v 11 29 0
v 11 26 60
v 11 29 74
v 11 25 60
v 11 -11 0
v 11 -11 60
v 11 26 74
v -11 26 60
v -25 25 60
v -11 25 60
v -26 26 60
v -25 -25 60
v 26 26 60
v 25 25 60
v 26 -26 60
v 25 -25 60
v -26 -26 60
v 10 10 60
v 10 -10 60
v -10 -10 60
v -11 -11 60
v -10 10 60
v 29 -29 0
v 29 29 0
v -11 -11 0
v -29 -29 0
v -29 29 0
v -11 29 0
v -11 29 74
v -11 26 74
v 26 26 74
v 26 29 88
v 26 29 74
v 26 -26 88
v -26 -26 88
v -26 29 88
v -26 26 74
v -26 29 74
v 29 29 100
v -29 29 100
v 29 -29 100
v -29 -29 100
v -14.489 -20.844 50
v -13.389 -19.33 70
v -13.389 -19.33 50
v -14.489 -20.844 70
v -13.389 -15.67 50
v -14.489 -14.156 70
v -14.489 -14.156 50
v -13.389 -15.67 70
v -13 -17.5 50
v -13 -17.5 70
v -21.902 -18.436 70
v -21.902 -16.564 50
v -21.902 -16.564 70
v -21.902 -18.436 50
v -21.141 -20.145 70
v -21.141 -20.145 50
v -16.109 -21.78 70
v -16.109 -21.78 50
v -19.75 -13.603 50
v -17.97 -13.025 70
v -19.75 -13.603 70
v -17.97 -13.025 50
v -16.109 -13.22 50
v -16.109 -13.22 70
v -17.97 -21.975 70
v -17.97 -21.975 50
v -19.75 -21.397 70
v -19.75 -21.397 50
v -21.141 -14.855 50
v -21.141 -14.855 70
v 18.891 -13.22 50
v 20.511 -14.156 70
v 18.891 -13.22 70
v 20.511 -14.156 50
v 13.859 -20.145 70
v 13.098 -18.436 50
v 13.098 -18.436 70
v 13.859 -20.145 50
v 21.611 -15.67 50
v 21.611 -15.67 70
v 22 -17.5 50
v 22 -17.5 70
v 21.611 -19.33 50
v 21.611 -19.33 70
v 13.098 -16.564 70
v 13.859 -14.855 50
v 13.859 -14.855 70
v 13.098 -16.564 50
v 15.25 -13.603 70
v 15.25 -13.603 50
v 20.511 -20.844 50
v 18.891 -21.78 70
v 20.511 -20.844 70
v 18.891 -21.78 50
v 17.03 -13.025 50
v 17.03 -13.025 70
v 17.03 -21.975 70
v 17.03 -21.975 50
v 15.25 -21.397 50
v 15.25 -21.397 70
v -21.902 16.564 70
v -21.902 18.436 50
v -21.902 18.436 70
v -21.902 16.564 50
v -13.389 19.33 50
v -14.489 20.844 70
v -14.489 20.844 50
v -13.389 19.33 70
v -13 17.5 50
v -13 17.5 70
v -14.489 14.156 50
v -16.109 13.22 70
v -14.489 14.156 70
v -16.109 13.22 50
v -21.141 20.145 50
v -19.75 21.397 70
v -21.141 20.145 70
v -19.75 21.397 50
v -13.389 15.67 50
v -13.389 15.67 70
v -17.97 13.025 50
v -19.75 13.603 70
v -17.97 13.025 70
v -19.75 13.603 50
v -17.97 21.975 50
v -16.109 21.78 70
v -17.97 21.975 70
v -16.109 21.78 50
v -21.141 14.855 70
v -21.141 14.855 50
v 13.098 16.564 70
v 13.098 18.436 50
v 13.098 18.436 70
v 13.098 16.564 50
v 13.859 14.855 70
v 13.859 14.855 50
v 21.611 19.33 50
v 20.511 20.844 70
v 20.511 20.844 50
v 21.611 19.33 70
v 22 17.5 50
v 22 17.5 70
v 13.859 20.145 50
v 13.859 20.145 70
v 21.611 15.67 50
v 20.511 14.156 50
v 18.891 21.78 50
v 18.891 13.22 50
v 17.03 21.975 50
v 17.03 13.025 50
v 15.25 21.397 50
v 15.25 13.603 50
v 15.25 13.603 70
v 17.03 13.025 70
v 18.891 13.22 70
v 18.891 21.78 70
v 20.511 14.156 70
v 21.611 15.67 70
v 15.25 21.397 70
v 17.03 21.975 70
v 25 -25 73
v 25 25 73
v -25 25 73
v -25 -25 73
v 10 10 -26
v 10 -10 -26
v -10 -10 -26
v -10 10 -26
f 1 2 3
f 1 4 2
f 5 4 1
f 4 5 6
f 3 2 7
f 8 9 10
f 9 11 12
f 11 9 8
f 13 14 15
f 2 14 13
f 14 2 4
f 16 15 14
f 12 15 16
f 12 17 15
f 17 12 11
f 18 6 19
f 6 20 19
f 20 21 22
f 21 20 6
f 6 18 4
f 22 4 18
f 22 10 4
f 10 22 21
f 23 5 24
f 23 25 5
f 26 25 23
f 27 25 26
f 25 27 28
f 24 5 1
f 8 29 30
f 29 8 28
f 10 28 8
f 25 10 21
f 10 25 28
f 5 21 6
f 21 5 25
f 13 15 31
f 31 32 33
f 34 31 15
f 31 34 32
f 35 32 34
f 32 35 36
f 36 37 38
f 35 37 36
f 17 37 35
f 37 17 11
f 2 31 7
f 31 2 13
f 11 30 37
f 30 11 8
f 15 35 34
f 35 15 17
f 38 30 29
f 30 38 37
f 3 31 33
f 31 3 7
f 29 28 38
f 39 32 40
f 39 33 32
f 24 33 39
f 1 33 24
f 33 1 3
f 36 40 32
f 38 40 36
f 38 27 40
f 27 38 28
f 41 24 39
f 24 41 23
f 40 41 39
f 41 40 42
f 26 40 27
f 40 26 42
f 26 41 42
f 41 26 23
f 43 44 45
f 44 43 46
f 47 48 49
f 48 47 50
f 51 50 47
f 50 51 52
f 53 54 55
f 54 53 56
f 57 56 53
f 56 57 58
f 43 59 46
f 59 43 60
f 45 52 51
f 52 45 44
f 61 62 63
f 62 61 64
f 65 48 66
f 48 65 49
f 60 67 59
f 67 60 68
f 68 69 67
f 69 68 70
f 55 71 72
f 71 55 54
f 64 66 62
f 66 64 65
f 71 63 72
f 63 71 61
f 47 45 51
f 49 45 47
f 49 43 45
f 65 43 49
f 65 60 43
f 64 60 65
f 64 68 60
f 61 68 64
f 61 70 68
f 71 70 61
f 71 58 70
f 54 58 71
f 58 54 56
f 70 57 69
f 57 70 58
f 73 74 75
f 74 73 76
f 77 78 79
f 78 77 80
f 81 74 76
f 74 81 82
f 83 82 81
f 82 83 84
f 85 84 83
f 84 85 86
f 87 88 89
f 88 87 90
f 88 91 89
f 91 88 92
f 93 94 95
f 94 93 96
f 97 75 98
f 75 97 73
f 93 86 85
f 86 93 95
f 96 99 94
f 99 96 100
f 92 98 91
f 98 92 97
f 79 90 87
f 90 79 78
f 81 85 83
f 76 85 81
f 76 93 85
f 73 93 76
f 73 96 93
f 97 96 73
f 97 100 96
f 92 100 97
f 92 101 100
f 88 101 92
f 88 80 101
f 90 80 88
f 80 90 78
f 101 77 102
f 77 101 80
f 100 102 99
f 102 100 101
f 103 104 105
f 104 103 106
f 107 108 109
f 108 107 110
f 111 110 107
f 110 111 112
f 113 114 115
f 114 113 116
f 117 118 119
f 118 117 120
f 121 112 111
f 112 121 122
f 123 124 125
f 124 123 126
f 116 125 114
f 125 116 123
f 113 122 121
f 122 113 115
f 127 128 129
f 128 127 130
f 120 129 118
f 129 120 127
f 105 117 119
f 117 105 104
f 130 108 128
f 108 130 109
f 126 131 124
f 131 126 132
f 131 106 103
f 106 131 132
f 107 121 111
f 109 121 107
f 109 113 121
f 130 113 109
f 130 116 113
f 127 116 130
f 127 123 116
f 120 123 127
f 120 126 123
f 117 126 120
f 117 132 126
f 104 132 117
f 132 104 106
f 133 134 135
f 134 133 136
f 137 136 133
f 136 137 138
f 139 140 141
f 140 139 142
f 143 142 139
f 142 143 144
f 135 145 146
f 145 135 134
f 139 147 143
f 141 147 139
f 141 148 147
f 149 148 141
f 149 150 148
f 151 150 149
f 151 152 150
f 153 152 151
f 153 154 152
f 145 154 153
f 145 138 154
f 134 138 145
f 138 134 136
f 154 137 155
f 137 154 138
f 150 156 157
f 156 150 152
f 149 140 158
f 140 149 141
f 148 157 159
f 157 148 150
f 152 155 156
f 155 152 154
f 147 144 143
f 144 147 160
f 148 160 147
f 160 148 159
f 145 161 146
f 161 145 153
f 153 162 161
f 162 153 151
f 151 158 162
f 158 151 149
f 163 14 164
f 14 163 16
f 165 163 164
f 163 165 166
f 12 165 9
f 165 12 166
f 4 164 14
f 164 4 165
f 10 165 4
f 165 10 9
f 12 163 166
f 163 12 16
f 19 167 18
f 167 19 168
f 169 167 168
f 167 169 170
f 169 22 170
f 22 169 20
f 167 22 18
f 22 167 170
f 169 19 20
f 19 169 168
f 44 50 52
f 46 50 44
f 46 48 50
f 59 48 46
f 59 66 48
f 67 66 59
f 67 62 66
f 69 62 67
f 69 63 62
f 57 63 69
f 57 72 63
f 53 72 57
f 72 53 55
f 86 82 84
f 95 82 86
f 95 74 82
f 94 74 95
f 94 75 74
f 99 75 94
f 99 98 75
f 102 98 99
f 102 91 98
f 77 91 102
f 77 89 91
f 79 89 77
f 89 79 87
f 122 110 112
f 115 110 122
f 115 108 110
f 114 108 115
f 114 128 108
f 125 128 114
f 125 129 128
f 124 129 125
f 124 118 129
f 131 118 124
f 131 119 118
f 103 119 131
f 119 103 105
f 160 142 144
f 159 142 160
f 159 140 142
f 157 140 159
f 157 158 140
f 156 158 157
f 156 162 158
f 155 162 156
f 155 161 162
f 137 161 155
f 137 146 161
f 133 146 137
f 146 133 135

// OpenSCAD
difference()  {
difference()  {
translate([-29.0,-29.0,0.0])  cube([58.0,58.0,100.0]);
union()  {
translate([-11.0,-11.0,0.0])  cube([22.0,22.0,60.0]);
translate([0.0,0.0,60.0])  translate([-26.0,-26.0,0.0])  cube([52.0,52.0,28.0]);
translate([-11.0,0.0,0.0])  cube([22.0,29.0,74.0]);
translate([-26.0,0.0,74.0])  cube([52.0,29.0,14.0]);
}
}
translate([0.0,0.0,50.0])  {
translate([-17.5,-17.5,0.0])  cylinder(r=4.5,h=10.0);
translate([17.5,-17.5,0.0])  cylinder(r=4.5,h=10.0);
translate([-17.5,17.5,0.0])  cylinder(r=4.5,h=10.0);
translate([17.5,17.5,0.0])  cylinder(r=4.5,h=10.0);
}
}
difference()  {
union()  {
translate([0.0,0.0,60.0])  translate([-25.0,-25.0,0.0])  cube([50.0,50.0,13.0]);
translate([0.0,0.0,-26.0])  translate([-10.0,-10.0,0.0])  cube([20.0,20.0,86.0]);
}
translate([0.0,0.0,60.0])  {
translate([-17.5,-17.5,0.0])  cylinder(r=4.5,h=10.0);
translate([17.5,-17.5,0.0])  cylinder(r=4.5,h=10.0);
translate([-17.5,17.5,0.0])  cylinder(r=4.5,h=10.0);
translate([17.5,17.5,0.0])  cylinder(r=4.5,h=10.0);
}
}
